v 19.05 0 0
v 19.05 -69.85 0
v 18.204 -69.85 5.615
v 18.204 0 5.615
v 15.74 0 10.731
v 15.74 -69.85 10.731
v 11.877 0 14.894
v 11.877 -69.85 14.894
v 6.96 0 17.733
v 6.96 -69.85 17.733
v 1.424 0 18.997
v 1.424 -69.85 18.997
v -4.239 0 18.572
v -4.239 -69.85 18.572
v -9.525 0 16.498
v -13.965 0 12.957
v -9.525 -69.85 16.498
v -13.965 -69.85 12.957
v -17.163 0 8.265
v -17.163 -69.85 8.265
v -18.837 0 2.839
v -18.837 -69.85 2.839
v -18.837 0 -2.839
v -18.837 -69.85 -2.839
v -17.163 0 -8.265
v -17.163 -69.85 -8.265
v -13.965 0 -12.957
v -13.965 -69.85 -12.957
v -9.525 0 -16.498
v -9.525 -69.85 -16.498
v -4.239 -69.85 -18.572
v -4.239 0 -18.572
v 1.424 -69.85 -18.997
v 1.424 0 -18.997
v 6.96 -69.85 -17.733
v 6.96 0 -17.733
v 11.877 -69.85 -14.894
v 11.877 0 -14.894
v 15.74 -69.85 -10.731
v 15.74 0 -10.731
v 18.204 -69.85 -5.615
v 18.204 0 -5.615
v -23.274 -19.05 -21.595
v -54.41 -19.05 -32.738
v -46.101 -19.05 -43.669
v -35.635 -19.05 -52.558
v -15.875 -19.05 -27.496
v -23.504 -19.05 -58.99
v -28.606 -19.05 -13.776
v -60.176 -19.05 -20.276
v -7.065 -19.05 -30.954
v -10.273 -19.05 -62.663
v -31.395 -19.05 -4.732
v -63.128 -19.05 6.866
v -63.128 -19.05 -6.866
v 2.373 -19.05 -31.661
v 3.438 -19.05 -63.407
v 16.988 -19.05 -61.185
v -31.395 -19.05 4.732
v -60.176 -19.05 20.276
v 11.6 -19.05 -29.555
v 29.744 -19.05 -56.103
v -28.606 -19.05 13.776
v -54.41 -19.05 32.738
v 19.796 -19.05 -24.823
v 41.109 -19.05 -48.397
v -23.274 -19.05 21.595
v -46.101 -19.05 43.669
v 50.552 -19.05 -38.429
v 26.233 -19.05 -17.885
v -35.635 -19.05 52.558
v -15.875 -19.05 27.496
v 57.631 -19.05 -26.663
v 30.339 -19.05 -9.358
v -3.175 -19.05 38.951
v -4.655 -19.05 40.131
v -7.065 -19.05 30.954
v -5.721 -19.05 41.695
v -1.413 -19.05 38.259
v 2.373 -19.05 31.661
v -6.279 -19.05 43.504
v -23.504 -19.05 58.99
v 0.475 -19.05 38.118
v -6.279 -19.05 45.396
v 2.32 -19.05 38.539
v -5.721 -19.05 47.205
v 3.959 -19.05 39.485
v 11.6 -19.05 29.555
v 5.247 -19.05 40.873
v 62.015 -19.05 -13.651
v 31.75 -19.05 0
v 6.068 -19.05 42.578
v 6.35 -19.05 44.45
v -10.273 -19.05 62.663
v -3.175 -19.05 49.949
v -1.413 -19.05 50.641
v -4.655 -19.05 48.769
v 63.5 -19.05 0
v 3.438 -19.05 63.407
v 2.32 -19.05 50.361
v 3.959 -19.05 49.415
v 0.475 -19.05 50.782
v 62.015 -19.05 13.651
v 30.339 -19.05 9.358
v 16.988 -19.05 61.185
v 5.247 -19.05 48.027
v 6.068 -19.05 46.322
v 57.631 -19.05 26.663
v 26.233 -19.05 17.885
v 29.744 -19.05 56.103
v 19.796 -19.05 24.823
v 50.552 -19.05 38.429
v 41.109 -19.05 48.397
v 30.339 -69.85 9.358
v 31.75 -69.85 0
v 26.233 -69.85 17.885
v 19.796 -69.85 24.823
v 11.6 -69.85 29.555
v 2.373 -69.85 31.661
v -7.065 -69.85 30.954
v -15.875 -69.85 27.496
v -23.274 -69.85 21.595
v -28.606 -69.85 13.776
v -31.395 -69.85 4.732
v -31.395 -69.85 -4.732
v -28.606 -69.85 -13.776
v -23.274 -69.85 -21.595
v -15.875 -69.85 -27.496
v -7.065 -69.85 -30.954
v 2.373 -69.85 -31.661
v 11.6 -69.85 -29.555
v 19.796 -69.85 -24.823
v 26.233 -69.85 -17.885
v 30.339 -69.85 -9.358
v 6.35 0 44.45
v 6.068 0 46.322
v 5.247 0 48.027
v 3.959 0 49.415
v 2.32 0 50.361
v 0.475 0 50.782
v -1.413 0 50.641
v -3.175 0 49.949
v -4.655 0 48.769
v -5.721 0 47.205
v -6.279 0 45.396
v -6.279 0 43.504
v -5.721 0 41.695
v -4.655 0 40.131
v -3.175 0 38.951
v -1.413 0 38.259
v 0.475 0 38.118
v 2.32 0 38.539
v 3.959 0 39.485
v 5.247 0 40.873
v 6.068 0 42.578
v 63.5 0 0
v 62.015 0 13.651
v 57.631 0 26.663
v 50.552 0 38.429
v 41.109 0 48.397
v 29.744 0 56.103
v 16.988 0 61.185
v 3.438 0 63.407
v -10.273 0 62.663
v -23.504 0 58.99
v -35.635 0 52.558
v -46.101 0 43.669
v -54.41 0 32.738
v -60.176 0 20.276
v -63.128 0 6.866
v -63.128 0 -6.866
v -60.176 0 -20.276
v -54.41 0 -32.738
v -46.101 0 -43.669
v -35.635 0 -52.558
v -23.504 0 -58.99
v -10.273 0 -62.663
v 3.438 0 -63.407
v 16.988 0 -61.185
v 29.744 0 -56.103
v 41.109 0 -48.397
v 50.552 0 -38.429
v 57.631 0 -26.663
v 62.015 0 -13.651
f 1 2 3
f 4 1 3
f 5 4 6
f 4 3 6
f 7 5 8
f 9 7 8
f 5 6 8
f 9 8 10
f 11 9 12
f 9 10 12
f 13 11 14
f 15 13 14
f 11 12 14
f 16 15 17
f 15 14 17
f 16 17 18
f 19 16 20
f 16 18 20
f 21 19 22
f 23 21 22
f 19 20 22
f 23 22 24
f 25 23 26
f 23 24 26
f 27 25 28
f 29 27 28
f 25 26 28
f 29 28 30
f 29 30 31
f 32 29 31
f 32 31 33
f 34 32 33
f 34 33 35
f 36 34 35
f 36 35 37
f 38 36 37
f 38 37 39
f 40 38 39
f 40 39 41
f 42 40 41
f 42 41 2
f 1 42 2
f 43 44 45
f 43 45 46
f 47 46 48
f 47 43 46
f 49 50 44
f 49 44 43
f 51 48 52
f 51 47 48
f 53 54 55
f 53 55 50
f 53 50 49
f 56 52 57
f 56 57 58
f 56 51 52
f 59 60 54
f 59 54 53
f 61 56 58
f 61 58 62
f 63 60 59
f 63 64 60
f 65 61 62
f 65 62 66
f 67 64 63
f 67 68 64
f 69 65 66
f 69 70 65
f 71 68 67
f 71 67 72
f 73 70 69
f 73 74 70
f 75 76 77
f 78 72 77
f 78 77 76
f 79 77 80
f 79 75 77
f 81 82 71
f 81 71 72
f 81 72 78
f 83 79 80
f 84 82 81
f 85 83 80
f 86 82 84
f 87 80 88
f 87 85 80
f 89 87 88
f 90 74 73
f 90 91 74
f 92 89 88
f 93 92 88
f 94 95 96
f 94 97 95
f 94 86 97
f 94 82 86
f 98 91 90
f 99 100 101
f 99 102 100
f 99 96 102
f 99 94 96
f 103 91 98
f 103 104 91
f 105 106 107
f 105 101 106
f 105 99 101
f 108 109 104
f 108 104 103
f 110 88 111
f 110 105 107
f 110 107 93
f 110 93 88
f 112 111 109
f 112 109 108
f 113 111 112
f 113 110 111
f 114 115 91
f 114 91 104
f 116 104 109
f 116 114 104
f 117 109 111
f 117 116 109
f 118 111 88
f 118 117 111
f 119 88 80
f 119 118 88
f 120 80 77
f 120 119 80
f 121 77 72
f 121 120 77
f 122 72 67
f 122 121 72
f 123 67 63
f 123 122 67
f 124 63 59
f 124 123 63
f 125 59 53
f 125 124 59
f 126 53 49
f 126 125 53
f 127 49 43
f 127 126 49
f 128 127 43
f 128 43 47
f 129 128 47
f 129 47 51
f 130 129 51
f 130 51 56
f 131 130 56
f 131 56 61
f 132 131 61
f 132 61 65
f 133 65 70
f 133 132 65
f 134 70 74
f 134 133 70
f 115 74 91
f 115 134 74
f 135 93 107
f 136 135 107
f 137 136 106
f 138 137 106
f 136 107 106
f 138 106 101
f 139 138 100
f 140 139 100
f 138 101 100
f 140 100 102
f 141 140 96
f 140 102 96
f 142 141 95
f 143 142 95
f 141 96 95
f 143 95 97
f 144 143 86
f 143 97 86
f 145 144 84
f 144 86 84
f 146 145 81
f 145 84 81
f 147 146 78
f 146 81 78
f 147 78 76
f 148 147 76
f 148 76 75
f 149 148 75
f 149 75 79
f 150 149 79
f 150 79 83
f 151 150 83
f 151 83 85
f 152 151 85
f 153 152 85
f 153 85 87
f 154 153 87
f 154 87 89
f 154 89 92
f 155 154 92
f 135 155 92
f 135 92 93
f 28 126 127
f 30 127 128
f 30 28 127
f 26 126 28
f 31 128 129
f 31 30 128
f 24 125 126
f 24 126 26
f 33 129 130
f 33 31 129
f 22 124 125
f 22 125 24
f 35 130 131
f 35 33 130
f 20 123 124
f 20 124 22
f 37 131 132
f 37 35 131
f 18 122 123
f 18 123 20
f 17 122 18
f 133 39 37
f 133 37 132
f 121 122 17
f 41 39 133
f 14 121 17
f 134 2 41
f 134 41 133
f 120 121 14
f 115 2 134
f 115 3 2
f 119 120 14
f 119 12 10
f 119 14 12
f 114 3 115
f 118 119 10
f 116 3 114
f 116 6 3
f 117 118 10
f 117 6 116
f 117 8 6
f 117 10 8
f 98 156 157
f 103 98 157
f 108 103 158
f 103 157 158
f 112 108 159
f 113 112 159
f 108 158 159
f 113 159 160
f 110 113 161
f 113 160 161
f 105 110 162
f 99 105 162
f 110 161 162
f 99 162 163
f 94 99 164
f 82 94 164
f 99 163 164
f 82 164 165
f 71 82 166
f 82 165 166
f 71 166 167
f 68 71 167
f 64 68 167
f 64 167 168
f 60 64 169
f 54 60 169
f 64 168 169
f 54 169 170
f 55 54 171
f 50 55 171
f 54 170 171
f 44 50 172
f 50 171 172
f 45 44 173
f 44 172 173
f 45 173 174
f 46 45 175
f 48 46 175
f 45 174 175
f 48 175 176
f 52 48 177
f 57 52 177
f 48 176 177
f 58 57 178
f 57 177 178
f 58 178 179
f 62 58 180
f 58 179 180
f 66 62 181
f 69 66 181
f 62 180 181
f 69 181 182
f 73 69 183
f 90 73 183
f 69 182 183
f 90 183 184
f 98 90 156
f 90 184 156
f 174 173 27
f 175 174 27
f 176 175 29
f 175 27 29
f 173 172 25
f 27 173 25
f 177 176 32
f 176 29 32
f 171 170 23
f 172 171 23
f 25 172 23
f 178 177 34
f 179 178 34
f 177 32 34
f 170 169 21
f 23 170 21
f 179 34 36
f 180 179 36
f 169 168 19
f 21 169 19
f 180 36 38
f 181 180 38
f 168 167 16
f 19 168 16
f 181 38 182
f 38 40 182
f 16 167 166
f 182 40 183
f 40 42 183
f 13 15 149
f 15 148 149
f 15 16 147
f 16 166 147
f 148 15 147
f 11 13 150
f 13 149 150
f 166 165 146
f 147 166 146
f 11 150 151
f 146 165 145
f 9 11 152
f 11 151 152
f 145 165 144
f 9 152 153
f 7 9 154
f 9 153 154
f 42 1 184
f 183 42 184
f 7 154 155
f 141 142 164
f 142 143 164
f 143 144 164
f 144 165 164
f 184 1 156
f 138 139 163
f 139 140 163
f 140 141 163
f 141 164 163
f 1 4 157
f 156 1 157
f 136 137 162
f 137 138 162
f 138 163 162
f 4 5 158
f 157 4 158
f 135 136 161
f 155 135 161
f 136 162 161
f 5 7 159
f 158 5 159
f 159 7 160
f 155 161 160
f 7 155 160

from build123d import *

# Parameters (mm, degrees)
F0_R     = 63.5
F1_DEPTH = 19.05
F3_R     = 31.75
F4_DEPTH = 50.8
F5_R     = 19.05
F6_DEPTH = 69.851
F7_R     = 6.35
F8_DEPTH = 19.051


with BuildPart() as f1:
    # F0 (on Front) → F1 (new body)
    with BuildSketch(Plane.XZ):
        Circle(F0_R)
    extrude(amount=F1_DEPTH)

    # F3 (on offset) → F4 (join, through all)
    with BuildSketch(Plane.XZ.offset(69.85)):
        Circle(F3_R)
    extrude(amount=-F4_DEPTH)

    # F5 (on face) → F6 (cut, through all)
    with BuildSketch(Plane.XZ.offset(69.85)):
        Circle(F5_R)
    extrude(amount=-F6_DEPTH, mode=Mode.SUBTRACT)

    # F7 (on face) → F8 (cut, through all)
    with BuildSketch(Plane.XZ.offset(19.05)):
        with Locations((0, 44.45)):
            Circle(F7_R)
    extrude(amount=-F8_DEPTH, mode=Mode.SUBTRACT)


solid = f1.part
